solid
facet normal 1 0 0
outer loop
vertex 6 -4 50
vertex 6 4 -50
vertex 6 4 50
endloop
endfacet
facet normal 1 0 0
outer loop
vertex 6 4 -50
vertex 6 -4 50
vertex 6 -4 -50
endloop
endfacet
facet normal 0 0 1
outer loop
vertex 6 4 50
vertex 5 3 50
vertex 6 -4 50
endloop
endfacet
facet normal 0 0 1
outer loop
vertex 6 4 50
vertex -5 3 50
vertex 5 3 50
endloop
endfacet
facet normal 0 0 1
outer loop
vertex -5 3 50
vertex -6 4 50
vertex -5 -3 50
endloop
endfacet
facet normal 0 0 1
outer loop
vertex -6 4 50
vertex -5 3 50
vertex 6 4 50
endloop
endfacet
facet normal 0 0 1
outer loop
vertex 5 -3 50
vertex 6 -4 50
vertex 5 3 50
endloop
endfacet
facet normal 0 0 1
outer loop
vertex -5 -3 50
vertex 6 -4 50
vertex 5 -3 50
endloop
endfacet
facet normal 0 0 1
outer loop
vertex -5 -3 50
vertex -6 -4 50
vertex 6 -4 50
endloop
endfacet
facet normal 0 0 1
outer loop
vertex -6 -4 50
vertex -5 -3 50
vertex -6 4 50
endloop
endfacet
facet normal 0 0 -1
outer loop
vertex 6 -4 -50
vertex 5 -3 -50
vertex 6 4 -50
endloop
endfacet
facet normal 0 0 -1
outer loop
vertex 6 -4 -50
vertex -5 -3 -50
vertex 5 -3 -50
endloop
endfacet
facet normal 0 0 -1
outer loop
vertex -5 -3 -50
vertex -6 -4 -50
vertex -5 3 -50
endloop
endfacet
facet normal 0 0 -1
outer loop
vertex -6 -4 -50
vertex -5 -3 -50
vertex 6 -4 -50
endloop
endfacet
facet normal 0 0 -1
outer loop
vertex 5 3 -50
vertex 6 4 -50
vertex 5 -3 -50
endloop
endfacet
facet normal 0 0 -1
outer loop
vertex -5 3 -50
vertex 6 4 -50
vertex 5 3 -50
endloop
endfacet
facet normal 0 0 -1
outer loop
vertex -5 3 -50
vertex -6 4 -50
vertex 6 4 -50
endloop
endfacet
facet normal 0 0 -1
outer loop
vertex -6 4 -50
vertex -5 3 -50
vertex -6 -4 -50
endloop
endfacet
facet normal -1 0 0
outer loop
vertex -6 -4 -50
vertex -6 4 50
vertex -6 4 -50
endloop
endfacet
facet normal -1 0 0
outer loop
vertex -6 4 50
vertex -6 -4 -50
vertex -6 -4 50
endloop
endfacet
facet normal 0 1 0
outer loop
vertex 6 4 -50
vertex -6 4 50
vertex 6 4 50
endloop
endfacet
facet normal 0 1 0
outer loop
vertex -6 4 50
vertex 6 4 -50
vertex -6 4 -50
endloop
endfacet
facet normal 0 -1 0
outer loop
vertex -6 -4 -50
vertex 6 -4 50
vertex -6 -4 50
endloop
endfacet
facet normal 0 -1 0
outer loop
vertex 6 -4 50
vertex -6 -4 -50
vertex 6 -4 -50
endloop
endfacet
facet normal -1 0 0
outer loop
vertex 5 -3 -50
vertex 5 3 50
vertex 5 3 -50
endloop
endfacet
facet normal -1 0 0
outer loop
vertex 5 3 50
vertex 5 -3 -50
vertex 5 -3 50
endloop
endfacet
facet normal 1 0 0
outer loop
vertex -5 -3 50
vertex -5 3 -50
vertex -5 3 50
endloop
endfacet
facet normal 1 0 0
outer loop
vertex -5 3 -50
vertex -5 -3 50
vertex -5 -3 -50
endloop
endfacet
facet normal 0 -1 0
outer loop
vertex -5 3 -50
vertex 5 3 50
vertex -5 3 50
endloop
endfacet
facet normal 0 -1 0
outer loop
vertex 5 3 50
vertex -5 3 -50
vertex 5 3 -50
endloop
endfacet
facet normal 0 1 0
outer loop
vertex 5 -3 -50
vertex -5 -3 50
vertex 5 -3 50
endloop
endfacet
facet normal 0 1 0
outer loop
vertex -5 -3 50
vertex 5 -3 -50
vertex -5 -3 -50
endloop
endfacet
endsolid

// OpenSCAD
// Aluminium rectangular box section: 12mm x 8mm x 1mm wall
// One connected solid, hollow via difference()

outer_width_mm     = 12;   //[6:24:0.5]
outer_height_mm    = 8;    //[4:16:0.5]
wall_thickness_mm  = 1;    //[0.5:2:0.1]
length_mm          = 100;  //[20:300:1]

// Small extra length for clean boolean subtraction (prevents coplanar faces)
overcut_mm = 0.2;

module rectangular_box_section(ow, oh, t, L) {
    // Ensure valid inner dimensions
    iw = ow - 2*t;
    ih = oh - 2*t;

    // If wall thickness is too large, clamp to keep a valid hollow
    iw2 = max(iw, 0.01);
    ih2 = max(ih, 0.01);

    color("Silver")
    difference() {
        // Outer tube
        cube([ow, oh, L], center=true);

        // Inner void (slightly longer to guarantee through-cut)
        cube([iw2, ih2, L + 2*overcut_mm], center=true);
    }
}

rectangular_box_section(outer_width_mm, outer_height_mm, wall_thickness_mm, length_mm);
